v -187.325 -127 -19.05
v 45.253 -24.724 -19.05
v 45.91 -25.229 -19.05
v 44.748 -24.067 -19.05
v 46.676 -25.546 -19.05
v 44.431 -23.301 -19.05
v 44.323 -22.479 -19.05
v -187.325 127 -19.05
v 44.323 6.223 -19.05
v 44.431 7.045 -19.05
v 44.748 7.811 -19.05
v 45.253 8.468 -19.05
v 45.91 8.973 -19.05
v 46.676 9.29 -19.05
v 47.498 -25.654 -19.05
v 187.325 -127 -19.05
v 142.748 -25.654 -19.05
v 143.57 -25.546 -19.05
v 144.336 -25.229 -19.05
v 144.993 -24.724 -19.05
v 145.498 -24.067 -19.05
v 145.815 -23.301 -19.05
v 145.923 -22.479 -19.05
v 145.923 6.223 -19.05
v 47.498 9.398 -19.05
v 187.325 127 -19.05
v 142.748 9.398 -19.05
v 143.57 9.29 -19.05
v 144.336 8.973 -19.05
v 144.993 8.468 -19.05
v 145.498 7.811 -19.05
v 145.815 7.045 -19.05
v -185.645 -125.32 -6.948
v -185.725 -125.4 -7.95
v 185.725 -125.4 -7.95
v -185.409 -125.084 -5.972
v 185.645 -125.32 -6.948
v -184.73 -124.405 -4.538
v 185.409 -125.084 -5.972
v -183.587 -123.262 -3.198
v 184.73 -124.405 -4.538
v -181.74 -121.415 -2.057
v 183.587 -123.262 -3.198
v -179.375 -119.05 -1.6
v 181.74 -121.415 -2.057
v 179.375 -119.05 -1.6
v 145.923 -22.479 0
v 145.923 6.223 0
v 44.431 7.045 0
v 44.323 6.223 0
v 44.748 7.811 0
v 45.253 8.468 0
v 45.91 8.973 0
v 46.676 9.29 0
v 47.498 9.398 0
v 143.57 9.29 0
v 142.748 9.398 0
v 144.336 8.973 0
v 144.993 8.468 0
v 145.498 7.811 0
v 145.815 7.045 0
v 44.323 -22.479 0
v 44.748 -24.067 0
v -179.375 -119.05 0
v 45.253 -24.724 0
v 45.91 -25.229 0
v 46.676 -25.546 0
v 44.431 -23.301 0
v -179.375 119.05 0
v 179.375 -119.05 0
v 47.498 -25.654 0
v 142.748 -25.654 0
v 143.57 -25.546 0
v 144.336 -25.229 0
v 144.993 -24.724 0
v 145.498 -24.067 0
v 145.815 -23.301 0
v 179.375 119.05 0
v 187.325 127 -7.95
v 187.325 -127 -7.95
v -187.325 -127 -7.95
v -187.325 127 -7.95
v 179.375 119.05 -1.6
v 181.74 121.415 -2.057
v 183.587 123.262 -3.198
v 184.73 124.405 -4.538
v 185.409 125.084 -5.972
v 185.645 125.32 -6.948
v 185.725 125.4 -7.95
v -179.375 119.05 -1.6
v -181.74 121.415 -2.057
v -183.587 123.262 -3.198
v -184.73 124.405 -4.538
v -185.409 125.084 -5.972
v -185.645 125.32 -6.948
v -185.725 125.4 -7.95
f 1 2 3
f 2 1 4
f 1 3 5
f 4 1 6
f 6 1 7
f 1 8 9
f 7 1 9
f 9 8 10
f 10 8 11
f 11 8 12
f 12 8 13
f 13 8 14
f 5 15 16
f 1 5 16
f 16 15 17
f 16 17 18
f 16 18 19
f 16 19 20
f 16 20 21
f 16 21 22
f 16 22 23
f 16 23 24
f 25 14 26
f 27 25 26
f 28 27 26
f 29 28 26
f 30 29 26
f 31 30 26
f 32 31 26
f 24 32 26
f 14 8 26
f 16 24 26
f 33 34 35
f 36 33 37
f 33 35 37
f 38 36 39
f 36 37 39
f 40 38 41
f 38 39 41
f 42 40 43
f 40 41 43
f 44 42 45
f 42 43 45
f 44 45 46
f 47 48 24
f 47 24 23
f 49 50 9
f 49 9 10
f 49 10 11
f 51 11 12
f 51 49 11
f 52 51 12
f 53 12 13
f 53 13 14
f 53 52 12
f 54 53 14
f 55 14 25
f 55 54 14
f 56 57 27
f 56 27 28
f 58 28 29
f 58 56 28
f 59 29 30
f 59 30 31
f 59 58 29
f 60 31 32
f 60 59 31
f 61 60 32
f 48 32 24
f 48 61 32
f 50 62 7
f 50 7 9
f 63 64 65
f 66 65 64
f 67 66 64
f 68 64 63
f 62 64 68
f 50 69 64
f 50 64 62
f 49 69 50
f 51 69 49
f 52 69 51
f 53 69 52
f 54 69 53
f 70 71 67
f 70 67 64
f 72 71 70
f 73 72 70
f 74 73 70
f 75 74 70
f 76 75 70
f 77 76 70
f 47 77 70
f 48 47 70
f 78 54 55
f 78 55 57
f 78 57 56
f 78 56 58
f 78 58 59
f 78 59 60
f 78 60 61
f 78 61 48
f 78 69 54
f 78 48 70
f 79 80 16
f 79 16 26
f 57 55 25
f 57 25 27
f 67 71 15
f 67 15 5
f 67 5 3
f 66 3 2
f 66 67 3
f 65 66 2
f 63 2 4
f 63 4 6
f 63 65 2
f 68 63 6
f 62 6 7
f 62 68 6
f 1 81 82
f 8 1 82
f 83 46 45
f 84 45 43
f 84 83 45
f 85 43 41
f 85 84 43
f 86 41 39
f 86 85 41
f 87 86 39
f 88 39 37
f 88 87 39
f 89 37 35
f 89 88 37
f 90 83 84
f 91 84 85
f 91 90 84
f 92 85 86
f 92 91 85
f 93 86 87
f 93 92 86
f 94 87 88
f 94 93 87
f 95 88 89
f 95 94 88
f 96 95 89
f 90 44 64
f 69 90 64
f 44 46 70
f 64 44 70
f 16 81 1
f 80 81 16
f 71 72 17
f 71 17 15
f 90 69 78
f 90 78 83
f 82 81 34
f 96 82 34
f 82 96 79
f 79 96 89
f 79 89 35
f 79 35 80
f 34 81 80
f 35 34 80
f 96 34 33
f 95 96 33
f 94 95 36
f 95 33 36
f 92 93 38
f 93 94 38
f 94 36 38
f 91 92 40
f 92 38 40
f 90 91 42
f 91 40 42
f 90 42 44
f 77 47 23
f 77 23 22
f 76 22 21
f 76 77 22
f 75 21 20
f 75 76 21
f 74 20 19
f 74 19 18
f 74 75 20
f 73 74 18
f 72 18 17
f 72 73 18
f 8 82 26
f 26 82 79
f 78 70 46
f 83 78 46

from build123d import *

# Parameters (mm, degrees)
F0_W     = 374.65
F0_H     = 254
F1_DEPTH = 19.05
F3_DEPTH = 152.4
F5_DEPTH = 203.2


with BuildPart() as f1:
    # F0 (on Top) → F1 (new body)
    with BuildSketch(Plane.XY):
        Rectangle(F0_W, F0_H)
        with BuildLine():
            Line((47.498, 9.398), (142.748, 9.398))
            ThreePointArc((142.748, 9.398), (144.9930640303, 8.4680640303), (145.923, 6.223))
            Line((145.923, 6.223), (145.923, -22.479))
            ThreePointArc((145.923, -22.479), (144.9930640303, -24.7240640303), (142.748, -25.654))
            Line((142.748, -25.654), (47.498, -25.654))
            ThreePointArc((47.498, -25.654), (45.2529359697, -24.7240640303), (44.323, -22.479))
            Line((44.323, -22.479), (44.323, 6.223))
            ThreePointArc((44.323, 6.223), (45.2529359697, 8.4680640303), (47.498, 9.398))
        make_face(mode=Mode.SUBTRACT)
    extrude(amount=-F1_DEPTH)

    # F2 (on Front) → F3 (cut, symmetric)
    with BuildSketch(Plane.XZ):
        with BuildLine():
            Line((187.325, 0), (179.3748, 0))
            Line((179.3748, 0), (179.3748, -1.6002))
            ThreePointArc((179.3748, -1.6002), (183.8649280605, -3.4600719395), (185.7248, -7.9502))
            Line((185.7248, -7.9502), (187.325, -7.9502))
            Line((187.325, -7.9502), (187.325, 0))
        make_face()
        with BuildLine():
            Line((-179.3748, -1.6002), (-179.3748, 0))
            Line((-179.3748, 0), (-187.325, 0))
            Line((-187.325, 0), (-187.325, -7.9502))
            Line((-187.325, -7.9502), (-185.7248, -7.9502))
            ThreePointArc((-185.7248, -7.9502), (-183.8649280605, -3.4600719395), (-179.3748, -1.6002))
        make_face()
    extrude(amount=F3_DEPTH, both=True, mode=Mode.SUBTRACT)

    # F4 (on Right) → F5 (cut, symmetric)
    with BuildSketch(Plane.YZ):
        with BuildLine():
            Line((127, 0), (119.0498, 0))
            Line((119.0498, 0), (119.0498, -1.6002))
            ThreePointArc((119.0498, -1.6002), (123.5399280605, -3.4600719395), (125.3998, -7.9502))
            Line((125.3998, -7.9502), (127, -7.9502))
            Line((127, -7.9502), (127, 0))
        make_face()
        with BuildLine():
            Line((-119.0498, -1.6002), (-119.0498, 0))
            Line((-119.0498, 0), (-127, 0))
            Line((-127, 0), (-127, -7.9502))
            Line((-127, -7.9502), (-125.3998, -7.9502))
            ThreePointArc((-125.3998, -7.9502), (-123.5399280605, -3.4600719395), (-119.0498, -1.6002))
        make_face()
    extrude(amount=F5_DEPTH, both=True, mode=Mode.SUBTRACT)


solid = f1.part
